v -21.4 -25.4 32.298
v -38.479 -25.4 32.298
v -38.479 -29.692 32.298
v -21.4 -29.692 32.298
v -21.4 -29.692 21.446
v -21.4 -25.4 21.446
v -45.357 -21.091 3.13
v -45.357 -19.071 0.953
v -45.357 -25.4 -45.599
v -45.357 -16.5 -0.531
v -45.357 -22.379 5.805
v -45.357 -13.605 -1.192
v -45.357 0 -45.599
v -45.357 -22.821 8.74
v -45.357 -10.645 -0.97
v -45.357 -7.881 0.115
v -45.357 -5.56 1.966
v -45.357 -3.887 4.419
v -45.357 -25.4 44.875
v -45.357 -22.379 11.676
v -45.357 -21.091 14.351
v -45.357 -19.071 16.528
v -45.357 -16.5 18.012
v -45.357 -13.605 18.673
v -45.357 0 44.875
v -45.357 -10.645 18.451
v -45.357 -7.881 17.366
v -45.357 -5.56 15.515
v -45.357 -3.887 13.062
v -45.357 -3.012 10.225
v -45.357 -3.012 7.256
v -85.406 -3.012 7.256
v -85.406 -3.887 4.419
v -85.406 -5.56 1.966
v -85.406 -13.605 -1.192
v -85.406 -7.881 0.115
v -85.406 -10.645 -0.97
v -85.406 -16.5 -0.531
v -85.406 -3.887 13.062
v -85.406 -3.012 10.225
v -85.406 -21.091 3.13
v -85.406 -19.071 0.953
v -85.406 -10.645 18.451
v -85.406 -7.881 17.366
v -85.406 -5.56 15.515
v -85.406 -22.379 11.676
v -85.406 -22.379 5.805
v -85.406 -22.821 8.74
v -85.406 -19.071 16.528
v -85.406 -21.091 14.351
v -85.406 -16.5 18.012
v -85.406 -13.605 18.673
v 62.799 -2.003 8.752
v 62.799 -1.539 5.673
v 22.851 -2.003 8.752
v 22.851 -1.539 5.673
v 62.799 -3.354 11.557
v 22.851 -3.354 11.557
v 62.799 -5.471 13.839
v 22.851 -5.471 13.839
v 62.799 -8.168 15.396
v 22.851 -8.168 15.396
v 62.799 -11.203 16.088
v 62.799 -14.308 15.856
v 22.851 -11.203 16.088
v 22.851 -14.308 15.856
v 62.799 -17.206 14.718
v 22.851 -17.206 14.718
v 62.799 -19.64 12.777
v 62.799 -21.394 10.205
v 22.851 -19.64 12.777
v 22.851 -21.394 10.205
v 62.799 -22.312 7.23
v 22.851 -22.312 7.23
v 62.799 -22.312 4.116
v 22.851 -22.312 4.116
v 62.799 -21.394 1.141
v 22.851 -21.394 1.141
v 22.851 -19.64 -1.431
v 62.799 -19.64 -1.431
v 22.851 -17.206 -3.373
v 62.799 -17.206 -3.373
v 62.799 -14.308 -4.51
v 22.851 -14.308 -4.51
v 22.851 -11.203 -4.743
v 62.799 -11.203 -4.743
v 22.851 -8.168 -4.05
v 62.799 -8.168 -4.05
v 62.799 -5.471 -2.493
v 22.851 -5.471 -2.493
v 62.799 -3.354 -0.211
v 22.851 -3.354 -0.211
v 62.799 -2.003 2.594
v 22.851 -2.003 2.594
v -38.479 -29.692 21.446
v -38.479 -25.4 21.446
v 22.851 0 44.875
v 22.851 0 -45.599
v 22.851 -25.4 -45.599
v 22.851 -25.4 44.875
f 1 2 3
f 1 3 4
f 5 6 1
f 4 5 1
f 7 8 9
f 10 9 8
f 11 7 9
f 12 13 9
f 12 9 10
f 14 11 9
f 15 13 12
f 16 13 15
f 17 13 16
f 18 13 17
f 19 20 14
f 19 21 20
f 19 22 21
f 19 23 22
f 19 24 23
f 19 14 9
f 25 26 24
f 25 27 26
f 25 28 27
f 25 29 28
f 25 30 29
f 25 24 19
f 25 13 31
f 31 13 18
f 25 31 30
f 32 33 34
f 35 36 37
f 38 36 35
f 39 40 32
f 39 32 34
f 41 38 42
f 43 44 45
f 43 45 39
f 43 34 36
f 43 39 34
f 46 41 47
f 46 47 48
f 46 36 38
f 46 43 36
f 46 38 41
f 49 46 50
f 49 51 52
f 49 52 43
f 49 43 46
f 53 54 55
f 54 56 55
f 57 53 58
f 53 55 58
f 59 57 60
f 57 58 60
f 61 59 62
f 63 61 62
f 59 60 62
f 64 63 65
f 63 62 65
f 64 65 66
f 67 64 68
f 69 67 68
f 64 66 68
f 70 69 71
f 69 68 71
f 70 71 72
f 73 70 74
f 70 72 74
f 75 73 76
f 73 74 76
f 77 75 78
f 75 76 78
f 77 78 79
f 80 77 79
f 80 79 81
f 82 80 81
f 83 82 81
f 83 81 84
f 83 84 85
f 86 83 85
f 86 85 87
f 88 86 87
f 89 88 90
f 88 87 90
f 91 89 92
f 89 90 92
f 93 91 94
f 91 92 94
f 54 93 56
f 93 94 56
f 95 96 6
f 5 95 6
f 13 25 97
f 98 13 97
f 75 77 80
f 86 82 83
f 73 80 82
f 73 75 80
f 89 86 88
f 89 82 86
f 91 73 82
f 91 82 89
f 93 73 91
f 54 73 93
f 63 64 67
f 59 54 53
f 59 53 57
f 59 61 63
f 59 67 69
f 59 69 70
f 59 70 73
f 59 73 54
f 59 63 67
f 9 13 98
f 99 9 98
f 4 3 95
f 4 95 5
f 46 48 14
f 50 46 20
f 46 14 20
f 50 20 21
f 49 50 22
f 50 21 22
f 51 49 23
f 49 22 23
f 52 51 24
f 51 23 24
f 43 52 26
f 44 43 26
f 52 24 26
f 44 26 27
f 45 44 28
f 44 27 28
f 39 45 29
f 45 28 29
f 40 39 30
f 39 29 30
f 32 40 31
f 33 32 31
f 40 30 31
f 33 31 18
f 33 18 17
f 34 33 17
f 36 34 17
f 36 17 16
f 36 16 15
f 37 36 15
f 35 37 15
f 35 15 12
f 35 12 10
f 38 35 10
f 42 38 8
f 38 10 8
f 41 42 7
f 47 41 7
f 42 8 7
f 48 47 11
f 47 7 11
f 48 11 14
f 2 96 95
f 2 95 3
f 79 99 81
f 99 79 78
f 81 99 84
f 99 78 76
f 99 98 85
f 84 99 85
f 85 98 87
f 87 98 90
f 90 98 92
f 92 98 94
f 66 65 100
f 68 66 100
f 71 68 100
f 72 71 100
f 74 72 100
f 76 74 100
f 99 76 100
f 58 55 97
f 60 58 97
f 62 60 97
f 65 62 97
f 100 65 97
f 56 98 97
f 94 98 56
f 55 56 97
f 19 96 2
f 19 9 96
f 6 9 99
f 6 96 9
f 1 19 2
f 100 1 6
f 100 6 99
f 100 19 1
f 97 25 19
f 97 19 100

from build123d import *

# Parameters (mm, degrees)
F0_W      = 68.2077519596
F0_H      = 90.4731266201
F1_DEPTH  = 25.4
F2_R      = 10.4447594079
F3_DEPTH  = 30.0825480372
F4_R      = 9.9602632564
F5_DEPTH  = 25.4
F6_DEPTH  = 14.6486386657
F7_DEPTH  = 77.0113542676
F8_DEPTH  = 7.2514917701
F9_DEPTH  = 2.6144357398
F10_W     = 17.0795619488
F10_H     = 10.8526591212
F11_DEPTH = 4.2919376865


with BuildPart() as f1:
    # F0 (on Front) → F1 (new body)
    with BuildSketch(Plane.XZ):
        with Locations((-11.2533476204, -0.3619696945)):
            Rectangle(F0_W, F0_H)
    extrude(amount=F1_DEPTH)

    # F2 (on face) → F3 (join)
    with BuildSketch(Plane.YZ.offset(22.8505283594)):
        with Locations((-11.9834244251, 5.6728608906)):
            Circle(F2_R)
    extrude(amount=F3_DEPTH)

    # F4 (on face) → F5 (join)
    with BuildSketch(Plane(origin=(-45.3572236001, 0, 0), x_dir=(0, -1, 0), z_dir=(-1, 0, 0))):
        with Locations((12.8610506654, 8.7403887883)):
            Circle(F4_R)
    extrude(amount=F5_DEPTH)

    # F6 (add): a face of the model
    f6_faces = [f1.faces().sort_by_distance(p)[0] for p in [
        (-70.7572236001, -12.8610506654, 8.7403887883),
    ]]
    extrude(f6_faces, amount=F6_DEPTH)

    # F7 (add): a face of the model
    f7_faces = [f1.faces().sort_by_distance(p)[0] for p in [
        (-85.4058622658, -12.8610506654, 8.7403887883),
    ]]
    extrude(f7_faces, amount=-F7_DEPTH)

    # F8 (add): a face of the model
    f8_faces = [f1.faces().sort_by_distance(p)[0] for p in [
        (52.9330763966, -11.9834244251, 5.6728608906),
    ]]
    extrude(f8_faces, amount=F8_DEPTH)

    # F9 (add): a face of the model
    f9_faces = [f1.faces().sort_by_distance(p)[0] for p in [
        (60.1845681667, -11.9834244251, 5.6728608906),
    ]]
    extrude(f9_faces, amount=F9_DEPTH)

    # F10 (on face) → F11 (join)
    with BuildSketch(Plane.XZ.offset(25.4)):
        with Locations((-29.9396589398, 26.8718404695)):
            Rectangle(F10_W, F10_H)
    extrude(amount=F11_DEPTH)


solid = f1.part
